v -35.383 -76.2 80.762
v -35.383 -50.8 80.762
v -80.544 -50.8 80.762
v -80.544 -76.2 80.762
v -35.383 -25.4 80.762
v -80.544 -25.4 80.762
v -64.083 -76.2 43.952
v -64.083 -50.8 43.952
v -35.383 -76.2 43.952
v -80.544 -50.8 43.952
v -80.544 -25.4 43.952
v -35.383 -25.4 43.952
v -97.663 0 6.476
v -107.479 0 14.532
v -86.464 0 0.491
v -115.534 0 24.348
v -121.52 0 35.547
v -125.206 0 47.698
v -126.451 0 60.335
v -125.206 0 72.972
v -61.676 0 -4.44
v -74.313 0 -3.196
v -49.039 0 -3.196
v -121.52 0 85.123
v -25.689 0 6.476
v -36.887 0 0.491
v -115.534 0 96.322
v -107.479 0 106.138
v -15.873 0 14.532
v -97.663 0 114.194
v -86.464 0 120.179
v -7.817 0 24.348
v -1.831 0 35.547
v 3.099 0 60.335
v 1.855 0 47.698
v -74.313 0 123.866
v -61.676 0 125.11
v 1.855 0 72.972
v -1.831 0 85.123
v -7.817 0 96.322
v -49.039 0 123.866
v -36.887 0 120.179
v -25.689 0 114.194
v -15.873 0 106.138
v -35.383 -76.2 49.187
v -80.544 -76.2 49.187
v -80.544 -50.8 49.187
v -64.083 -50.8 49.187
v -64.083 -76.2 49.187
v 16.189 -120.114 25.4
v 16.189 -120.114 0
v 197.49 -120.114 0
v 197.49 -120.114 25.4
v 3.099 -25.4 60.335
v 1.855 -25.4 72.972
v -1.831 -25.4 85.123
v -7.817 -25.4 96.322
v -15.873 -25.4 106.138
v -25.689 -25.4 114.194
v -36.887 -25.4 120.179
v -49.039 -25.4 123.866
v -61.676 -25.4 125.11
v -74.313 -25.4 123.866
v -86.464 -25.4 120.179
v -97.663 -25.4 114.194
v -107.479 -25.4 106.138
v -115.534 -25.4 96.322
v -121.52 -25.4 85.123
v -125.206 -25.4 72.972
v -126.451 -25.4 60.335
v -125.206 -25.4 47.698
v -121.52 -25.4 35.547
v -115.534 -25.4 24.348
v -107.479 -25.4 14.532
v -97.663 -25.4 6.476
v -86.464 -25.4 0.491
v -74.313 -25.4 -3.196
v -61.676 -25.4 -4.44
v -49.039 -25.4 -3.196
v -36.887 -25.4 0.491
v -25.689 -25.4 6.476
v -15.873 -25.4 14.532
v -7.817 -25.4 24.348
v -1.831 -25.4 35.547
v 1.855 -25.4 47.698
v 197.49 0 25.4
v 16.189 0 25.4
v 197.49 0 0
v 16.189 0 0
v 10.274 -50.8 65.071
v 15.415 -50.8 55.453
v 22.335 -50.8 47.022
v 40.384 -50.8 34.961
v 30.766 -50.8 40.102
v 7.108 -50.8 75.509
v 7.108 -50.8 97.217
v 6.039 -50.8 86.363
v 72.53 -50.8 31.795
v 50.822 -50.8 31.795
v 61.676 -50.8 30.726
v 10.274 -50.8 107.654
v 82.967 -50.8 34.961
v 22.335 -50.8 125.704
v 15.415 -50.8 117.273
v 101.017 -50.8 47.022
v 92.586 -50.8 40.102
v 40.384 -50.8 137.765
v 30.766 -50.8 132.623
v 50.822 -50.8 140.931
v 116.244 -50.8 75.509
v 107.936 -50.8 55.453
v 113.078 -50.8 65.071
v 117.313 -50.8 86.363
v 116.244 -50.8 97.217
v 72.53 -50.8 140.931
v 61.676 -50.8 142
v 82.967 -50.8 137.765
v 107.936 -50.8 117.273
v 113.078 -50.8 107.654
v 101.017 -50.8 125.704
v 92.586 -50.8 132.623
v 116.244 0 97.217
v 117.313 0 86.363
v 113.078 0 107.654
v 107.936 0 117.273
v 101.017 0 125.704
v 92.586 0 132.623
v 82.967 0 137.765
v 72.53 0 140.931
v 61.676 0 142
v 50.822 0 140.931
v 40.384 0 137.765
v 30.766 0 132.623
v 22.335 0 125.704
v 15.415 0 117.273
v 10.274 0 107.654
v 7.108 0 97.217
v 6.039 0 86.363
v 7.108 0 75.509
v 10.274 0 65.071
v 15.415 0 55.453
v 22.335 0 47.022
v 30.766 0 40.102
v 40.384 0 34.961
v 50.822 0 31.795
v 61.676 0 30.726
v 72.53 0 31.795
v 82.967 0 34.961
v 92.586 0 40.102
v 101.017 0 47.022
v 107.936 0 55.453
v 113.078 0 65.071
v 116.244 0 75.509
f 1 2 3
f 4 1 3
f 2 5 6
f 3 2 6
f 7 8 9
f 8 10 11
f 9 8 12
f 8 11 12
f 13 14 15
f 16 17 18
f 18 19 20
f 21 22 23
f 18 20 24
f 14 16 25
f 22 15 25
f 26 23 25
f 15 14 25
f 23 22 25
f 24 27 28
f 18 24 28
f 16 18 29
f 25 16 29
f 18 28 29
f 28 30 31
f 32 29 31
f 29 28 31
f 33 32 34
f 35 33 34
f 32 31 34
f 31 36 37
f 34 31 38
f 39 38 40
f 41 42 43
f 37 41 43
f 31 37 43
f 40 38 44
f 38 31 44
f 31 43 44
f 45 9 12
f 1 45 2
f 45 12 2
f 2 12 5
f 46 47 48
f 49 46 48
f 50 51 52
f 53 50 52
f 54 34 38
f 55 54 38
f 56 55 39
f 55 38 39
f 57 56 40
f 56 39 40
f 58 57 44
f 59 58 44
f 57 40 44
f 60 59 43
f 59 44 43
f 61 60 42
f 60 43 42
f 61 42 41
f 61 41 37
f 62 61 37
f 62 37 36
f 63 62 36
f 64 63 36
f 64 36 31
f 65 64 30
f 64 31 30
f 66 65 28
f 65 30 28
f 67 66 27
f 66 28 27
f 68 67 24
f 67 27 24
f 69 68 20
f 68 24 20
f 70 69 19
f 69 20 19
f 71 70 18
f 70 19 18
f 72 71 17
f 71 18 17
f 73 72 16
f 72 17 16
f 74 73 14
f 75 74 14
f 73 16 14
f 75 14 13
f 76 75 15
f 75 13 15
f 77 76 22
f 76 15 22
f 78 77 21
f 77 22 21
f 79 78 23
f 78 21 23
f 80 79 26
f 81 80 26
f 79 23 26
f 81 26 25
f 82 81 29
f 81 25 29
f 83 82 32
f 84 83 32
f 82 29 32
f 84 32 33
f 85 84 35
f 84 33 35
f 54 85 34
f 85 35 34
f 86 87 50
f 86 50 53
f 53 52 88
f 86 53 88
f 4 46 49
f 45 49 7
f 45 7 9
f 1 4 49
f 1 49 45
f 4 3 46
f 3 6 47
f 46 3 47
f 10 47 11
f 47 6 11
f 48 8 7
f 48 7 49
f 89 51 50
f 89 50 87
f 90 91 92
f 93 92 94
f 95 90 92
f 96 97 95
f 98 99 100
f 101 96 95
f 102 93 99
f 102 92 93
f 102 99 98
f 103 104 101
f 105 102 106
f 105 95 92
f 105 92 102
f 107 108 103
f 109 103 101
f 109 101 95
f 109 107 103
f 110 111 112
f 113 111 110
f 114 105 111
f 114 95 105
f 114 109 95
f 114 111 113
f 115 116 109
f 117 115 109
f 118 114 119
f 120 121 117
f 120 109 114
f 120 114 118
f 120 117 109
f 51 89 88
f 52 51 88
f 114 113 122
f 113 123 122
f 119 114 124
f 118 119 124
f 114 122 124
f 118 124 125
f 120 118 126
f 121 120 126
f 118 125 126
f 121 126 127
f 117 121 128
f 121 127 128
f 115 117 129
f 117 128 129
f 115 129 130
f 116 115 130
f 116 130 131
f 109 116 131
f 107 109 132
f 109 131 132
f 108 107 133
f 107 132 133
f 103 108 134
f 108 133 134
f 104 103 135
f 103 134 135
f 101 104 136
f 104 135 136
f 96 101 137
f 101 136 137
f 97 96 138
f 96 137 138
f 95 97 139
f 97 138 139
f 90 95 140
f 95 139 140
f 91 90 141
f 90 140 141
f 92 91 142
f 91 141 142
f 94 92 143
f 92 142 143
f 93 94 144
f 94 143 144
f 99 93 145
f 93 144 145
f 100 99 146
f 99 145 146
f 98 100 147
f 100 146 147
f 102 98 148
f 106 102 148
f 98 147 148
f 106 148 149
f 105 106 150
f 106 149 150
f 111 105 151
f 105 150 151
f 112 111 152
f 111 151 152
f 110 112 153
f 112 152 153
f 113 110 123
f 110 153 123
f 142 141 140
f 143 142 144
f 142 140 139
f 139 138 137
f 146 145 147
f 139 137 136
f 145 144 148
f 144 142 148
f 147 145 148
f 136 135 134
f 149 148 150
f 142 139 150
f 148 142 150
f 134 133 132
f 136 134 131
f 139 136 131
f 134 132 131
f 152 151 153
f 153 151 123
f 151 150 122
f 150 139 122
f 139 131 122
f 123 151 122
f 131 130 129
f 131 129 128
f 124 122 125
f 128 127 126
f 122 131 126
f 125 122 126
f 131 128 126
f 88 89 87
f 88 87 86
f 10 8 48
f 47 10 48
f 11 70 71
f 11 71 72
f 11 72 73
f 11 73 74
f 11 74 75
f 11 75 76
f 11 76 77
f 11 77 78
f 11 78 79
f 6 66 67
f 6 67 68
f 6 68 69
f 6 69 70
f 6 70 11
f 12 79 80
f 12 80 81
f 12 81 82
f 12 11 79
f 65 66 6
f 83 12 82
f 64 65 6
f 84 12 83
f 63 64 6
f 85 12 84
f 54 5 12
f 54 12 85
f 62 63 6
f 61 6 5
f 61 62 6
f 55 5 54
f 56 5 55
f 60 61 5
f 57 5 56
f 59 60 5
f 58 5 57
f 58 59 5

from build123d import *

# Parameters (mm, degrees)
F0_R      = 64.7752011443
F1_DEPTH  = 25.4
F2_W      = 19.7602212429
F2_H      = 36.8101298809
F3_DEPTH  = 25.4
F4_DEPTH  = 25.4
F5_W      = 28.6991394401
F5_H      = 5.2353404462
F6_DEPTH  = 25.4
F7_W      = 181.3011337072
F7_H      = 120.1144829392
F8_DEPTH  = 25.4
F9_R      = 55.6370243783
F10_DEPTH = 25.4
F11_DEPTH = 25.4


with BuildPart() as f1:
    # F0 (on Front) → F1 (new body)
    with BuildSketch(Plane.XZ):
        with Locations((-61.6758428514, 60.3350028396)):
            Circle(F0_R)
    extrude(amount=F1_DEPTH)

    # F2 (on face) → F3 (join)
    with BuildSketch(Plane.XZ.offset(25.4)):
        with Locations((-70.6635266542, 62.3567551374)):
            Rectangle(F2_W, F2_H)
    extrude(amount=F3_DEPTH)

    # F4 (add): a face of the model
    f4_faces = [f1.faces().sort_by_distance(p)[0] for p in [
        (-60.7834160328, -38.1, 62.3567551374),
    ]]
    extrude(f4_faces, amount=F4_DEPTH)

    # F5 (on face) → F6 (join)
    with BuildSketch(Plane.XZ.offset(50.8)):
        with Locations((-49.7329857528, 46.5693604201)):
            Rectangle(F5_W, F5_H)
        Polygon((-35.3834160328, 80.7618200779), (-80.5436372757, 80.7618200779), (-80.5436372757, 49.1870306432), (-64.0825554729, 49.1870306432), (-35.3834160328, 49.1870306432), align=None)
    extrude(amount=F6_DEPTH)


with BuildPart() as f8:
    # F7 (on Top) → F8 (new body)
    with BuildSketch(Plane.XY):
        with Locations((106.8395888433, -60.0572414696)):
            Rectangle(F7_W, F7_H)
    extrude(amount=F8_DEPTH)


with BuildPart() as f10:
    # F9 (on Front) → F10 (new body)
    with BuildSketch(Plane.XZ):
        with Locations((61.6758391261, 86.3628461957)):
            Circle(F9_R)
    extrude(amount=F10_DEPTH)

    # F11 (add): a face of the model
    f11_faces = [f10.faces().sort_by_distance(p)[0] for p in [
        (61.6758391261, -25.4, 86.3628461957),
    ]]
    extrude(f11_faces, amount=F11_DEPTH)


solid = Compound([f1.part, f8.part, f10.part])
